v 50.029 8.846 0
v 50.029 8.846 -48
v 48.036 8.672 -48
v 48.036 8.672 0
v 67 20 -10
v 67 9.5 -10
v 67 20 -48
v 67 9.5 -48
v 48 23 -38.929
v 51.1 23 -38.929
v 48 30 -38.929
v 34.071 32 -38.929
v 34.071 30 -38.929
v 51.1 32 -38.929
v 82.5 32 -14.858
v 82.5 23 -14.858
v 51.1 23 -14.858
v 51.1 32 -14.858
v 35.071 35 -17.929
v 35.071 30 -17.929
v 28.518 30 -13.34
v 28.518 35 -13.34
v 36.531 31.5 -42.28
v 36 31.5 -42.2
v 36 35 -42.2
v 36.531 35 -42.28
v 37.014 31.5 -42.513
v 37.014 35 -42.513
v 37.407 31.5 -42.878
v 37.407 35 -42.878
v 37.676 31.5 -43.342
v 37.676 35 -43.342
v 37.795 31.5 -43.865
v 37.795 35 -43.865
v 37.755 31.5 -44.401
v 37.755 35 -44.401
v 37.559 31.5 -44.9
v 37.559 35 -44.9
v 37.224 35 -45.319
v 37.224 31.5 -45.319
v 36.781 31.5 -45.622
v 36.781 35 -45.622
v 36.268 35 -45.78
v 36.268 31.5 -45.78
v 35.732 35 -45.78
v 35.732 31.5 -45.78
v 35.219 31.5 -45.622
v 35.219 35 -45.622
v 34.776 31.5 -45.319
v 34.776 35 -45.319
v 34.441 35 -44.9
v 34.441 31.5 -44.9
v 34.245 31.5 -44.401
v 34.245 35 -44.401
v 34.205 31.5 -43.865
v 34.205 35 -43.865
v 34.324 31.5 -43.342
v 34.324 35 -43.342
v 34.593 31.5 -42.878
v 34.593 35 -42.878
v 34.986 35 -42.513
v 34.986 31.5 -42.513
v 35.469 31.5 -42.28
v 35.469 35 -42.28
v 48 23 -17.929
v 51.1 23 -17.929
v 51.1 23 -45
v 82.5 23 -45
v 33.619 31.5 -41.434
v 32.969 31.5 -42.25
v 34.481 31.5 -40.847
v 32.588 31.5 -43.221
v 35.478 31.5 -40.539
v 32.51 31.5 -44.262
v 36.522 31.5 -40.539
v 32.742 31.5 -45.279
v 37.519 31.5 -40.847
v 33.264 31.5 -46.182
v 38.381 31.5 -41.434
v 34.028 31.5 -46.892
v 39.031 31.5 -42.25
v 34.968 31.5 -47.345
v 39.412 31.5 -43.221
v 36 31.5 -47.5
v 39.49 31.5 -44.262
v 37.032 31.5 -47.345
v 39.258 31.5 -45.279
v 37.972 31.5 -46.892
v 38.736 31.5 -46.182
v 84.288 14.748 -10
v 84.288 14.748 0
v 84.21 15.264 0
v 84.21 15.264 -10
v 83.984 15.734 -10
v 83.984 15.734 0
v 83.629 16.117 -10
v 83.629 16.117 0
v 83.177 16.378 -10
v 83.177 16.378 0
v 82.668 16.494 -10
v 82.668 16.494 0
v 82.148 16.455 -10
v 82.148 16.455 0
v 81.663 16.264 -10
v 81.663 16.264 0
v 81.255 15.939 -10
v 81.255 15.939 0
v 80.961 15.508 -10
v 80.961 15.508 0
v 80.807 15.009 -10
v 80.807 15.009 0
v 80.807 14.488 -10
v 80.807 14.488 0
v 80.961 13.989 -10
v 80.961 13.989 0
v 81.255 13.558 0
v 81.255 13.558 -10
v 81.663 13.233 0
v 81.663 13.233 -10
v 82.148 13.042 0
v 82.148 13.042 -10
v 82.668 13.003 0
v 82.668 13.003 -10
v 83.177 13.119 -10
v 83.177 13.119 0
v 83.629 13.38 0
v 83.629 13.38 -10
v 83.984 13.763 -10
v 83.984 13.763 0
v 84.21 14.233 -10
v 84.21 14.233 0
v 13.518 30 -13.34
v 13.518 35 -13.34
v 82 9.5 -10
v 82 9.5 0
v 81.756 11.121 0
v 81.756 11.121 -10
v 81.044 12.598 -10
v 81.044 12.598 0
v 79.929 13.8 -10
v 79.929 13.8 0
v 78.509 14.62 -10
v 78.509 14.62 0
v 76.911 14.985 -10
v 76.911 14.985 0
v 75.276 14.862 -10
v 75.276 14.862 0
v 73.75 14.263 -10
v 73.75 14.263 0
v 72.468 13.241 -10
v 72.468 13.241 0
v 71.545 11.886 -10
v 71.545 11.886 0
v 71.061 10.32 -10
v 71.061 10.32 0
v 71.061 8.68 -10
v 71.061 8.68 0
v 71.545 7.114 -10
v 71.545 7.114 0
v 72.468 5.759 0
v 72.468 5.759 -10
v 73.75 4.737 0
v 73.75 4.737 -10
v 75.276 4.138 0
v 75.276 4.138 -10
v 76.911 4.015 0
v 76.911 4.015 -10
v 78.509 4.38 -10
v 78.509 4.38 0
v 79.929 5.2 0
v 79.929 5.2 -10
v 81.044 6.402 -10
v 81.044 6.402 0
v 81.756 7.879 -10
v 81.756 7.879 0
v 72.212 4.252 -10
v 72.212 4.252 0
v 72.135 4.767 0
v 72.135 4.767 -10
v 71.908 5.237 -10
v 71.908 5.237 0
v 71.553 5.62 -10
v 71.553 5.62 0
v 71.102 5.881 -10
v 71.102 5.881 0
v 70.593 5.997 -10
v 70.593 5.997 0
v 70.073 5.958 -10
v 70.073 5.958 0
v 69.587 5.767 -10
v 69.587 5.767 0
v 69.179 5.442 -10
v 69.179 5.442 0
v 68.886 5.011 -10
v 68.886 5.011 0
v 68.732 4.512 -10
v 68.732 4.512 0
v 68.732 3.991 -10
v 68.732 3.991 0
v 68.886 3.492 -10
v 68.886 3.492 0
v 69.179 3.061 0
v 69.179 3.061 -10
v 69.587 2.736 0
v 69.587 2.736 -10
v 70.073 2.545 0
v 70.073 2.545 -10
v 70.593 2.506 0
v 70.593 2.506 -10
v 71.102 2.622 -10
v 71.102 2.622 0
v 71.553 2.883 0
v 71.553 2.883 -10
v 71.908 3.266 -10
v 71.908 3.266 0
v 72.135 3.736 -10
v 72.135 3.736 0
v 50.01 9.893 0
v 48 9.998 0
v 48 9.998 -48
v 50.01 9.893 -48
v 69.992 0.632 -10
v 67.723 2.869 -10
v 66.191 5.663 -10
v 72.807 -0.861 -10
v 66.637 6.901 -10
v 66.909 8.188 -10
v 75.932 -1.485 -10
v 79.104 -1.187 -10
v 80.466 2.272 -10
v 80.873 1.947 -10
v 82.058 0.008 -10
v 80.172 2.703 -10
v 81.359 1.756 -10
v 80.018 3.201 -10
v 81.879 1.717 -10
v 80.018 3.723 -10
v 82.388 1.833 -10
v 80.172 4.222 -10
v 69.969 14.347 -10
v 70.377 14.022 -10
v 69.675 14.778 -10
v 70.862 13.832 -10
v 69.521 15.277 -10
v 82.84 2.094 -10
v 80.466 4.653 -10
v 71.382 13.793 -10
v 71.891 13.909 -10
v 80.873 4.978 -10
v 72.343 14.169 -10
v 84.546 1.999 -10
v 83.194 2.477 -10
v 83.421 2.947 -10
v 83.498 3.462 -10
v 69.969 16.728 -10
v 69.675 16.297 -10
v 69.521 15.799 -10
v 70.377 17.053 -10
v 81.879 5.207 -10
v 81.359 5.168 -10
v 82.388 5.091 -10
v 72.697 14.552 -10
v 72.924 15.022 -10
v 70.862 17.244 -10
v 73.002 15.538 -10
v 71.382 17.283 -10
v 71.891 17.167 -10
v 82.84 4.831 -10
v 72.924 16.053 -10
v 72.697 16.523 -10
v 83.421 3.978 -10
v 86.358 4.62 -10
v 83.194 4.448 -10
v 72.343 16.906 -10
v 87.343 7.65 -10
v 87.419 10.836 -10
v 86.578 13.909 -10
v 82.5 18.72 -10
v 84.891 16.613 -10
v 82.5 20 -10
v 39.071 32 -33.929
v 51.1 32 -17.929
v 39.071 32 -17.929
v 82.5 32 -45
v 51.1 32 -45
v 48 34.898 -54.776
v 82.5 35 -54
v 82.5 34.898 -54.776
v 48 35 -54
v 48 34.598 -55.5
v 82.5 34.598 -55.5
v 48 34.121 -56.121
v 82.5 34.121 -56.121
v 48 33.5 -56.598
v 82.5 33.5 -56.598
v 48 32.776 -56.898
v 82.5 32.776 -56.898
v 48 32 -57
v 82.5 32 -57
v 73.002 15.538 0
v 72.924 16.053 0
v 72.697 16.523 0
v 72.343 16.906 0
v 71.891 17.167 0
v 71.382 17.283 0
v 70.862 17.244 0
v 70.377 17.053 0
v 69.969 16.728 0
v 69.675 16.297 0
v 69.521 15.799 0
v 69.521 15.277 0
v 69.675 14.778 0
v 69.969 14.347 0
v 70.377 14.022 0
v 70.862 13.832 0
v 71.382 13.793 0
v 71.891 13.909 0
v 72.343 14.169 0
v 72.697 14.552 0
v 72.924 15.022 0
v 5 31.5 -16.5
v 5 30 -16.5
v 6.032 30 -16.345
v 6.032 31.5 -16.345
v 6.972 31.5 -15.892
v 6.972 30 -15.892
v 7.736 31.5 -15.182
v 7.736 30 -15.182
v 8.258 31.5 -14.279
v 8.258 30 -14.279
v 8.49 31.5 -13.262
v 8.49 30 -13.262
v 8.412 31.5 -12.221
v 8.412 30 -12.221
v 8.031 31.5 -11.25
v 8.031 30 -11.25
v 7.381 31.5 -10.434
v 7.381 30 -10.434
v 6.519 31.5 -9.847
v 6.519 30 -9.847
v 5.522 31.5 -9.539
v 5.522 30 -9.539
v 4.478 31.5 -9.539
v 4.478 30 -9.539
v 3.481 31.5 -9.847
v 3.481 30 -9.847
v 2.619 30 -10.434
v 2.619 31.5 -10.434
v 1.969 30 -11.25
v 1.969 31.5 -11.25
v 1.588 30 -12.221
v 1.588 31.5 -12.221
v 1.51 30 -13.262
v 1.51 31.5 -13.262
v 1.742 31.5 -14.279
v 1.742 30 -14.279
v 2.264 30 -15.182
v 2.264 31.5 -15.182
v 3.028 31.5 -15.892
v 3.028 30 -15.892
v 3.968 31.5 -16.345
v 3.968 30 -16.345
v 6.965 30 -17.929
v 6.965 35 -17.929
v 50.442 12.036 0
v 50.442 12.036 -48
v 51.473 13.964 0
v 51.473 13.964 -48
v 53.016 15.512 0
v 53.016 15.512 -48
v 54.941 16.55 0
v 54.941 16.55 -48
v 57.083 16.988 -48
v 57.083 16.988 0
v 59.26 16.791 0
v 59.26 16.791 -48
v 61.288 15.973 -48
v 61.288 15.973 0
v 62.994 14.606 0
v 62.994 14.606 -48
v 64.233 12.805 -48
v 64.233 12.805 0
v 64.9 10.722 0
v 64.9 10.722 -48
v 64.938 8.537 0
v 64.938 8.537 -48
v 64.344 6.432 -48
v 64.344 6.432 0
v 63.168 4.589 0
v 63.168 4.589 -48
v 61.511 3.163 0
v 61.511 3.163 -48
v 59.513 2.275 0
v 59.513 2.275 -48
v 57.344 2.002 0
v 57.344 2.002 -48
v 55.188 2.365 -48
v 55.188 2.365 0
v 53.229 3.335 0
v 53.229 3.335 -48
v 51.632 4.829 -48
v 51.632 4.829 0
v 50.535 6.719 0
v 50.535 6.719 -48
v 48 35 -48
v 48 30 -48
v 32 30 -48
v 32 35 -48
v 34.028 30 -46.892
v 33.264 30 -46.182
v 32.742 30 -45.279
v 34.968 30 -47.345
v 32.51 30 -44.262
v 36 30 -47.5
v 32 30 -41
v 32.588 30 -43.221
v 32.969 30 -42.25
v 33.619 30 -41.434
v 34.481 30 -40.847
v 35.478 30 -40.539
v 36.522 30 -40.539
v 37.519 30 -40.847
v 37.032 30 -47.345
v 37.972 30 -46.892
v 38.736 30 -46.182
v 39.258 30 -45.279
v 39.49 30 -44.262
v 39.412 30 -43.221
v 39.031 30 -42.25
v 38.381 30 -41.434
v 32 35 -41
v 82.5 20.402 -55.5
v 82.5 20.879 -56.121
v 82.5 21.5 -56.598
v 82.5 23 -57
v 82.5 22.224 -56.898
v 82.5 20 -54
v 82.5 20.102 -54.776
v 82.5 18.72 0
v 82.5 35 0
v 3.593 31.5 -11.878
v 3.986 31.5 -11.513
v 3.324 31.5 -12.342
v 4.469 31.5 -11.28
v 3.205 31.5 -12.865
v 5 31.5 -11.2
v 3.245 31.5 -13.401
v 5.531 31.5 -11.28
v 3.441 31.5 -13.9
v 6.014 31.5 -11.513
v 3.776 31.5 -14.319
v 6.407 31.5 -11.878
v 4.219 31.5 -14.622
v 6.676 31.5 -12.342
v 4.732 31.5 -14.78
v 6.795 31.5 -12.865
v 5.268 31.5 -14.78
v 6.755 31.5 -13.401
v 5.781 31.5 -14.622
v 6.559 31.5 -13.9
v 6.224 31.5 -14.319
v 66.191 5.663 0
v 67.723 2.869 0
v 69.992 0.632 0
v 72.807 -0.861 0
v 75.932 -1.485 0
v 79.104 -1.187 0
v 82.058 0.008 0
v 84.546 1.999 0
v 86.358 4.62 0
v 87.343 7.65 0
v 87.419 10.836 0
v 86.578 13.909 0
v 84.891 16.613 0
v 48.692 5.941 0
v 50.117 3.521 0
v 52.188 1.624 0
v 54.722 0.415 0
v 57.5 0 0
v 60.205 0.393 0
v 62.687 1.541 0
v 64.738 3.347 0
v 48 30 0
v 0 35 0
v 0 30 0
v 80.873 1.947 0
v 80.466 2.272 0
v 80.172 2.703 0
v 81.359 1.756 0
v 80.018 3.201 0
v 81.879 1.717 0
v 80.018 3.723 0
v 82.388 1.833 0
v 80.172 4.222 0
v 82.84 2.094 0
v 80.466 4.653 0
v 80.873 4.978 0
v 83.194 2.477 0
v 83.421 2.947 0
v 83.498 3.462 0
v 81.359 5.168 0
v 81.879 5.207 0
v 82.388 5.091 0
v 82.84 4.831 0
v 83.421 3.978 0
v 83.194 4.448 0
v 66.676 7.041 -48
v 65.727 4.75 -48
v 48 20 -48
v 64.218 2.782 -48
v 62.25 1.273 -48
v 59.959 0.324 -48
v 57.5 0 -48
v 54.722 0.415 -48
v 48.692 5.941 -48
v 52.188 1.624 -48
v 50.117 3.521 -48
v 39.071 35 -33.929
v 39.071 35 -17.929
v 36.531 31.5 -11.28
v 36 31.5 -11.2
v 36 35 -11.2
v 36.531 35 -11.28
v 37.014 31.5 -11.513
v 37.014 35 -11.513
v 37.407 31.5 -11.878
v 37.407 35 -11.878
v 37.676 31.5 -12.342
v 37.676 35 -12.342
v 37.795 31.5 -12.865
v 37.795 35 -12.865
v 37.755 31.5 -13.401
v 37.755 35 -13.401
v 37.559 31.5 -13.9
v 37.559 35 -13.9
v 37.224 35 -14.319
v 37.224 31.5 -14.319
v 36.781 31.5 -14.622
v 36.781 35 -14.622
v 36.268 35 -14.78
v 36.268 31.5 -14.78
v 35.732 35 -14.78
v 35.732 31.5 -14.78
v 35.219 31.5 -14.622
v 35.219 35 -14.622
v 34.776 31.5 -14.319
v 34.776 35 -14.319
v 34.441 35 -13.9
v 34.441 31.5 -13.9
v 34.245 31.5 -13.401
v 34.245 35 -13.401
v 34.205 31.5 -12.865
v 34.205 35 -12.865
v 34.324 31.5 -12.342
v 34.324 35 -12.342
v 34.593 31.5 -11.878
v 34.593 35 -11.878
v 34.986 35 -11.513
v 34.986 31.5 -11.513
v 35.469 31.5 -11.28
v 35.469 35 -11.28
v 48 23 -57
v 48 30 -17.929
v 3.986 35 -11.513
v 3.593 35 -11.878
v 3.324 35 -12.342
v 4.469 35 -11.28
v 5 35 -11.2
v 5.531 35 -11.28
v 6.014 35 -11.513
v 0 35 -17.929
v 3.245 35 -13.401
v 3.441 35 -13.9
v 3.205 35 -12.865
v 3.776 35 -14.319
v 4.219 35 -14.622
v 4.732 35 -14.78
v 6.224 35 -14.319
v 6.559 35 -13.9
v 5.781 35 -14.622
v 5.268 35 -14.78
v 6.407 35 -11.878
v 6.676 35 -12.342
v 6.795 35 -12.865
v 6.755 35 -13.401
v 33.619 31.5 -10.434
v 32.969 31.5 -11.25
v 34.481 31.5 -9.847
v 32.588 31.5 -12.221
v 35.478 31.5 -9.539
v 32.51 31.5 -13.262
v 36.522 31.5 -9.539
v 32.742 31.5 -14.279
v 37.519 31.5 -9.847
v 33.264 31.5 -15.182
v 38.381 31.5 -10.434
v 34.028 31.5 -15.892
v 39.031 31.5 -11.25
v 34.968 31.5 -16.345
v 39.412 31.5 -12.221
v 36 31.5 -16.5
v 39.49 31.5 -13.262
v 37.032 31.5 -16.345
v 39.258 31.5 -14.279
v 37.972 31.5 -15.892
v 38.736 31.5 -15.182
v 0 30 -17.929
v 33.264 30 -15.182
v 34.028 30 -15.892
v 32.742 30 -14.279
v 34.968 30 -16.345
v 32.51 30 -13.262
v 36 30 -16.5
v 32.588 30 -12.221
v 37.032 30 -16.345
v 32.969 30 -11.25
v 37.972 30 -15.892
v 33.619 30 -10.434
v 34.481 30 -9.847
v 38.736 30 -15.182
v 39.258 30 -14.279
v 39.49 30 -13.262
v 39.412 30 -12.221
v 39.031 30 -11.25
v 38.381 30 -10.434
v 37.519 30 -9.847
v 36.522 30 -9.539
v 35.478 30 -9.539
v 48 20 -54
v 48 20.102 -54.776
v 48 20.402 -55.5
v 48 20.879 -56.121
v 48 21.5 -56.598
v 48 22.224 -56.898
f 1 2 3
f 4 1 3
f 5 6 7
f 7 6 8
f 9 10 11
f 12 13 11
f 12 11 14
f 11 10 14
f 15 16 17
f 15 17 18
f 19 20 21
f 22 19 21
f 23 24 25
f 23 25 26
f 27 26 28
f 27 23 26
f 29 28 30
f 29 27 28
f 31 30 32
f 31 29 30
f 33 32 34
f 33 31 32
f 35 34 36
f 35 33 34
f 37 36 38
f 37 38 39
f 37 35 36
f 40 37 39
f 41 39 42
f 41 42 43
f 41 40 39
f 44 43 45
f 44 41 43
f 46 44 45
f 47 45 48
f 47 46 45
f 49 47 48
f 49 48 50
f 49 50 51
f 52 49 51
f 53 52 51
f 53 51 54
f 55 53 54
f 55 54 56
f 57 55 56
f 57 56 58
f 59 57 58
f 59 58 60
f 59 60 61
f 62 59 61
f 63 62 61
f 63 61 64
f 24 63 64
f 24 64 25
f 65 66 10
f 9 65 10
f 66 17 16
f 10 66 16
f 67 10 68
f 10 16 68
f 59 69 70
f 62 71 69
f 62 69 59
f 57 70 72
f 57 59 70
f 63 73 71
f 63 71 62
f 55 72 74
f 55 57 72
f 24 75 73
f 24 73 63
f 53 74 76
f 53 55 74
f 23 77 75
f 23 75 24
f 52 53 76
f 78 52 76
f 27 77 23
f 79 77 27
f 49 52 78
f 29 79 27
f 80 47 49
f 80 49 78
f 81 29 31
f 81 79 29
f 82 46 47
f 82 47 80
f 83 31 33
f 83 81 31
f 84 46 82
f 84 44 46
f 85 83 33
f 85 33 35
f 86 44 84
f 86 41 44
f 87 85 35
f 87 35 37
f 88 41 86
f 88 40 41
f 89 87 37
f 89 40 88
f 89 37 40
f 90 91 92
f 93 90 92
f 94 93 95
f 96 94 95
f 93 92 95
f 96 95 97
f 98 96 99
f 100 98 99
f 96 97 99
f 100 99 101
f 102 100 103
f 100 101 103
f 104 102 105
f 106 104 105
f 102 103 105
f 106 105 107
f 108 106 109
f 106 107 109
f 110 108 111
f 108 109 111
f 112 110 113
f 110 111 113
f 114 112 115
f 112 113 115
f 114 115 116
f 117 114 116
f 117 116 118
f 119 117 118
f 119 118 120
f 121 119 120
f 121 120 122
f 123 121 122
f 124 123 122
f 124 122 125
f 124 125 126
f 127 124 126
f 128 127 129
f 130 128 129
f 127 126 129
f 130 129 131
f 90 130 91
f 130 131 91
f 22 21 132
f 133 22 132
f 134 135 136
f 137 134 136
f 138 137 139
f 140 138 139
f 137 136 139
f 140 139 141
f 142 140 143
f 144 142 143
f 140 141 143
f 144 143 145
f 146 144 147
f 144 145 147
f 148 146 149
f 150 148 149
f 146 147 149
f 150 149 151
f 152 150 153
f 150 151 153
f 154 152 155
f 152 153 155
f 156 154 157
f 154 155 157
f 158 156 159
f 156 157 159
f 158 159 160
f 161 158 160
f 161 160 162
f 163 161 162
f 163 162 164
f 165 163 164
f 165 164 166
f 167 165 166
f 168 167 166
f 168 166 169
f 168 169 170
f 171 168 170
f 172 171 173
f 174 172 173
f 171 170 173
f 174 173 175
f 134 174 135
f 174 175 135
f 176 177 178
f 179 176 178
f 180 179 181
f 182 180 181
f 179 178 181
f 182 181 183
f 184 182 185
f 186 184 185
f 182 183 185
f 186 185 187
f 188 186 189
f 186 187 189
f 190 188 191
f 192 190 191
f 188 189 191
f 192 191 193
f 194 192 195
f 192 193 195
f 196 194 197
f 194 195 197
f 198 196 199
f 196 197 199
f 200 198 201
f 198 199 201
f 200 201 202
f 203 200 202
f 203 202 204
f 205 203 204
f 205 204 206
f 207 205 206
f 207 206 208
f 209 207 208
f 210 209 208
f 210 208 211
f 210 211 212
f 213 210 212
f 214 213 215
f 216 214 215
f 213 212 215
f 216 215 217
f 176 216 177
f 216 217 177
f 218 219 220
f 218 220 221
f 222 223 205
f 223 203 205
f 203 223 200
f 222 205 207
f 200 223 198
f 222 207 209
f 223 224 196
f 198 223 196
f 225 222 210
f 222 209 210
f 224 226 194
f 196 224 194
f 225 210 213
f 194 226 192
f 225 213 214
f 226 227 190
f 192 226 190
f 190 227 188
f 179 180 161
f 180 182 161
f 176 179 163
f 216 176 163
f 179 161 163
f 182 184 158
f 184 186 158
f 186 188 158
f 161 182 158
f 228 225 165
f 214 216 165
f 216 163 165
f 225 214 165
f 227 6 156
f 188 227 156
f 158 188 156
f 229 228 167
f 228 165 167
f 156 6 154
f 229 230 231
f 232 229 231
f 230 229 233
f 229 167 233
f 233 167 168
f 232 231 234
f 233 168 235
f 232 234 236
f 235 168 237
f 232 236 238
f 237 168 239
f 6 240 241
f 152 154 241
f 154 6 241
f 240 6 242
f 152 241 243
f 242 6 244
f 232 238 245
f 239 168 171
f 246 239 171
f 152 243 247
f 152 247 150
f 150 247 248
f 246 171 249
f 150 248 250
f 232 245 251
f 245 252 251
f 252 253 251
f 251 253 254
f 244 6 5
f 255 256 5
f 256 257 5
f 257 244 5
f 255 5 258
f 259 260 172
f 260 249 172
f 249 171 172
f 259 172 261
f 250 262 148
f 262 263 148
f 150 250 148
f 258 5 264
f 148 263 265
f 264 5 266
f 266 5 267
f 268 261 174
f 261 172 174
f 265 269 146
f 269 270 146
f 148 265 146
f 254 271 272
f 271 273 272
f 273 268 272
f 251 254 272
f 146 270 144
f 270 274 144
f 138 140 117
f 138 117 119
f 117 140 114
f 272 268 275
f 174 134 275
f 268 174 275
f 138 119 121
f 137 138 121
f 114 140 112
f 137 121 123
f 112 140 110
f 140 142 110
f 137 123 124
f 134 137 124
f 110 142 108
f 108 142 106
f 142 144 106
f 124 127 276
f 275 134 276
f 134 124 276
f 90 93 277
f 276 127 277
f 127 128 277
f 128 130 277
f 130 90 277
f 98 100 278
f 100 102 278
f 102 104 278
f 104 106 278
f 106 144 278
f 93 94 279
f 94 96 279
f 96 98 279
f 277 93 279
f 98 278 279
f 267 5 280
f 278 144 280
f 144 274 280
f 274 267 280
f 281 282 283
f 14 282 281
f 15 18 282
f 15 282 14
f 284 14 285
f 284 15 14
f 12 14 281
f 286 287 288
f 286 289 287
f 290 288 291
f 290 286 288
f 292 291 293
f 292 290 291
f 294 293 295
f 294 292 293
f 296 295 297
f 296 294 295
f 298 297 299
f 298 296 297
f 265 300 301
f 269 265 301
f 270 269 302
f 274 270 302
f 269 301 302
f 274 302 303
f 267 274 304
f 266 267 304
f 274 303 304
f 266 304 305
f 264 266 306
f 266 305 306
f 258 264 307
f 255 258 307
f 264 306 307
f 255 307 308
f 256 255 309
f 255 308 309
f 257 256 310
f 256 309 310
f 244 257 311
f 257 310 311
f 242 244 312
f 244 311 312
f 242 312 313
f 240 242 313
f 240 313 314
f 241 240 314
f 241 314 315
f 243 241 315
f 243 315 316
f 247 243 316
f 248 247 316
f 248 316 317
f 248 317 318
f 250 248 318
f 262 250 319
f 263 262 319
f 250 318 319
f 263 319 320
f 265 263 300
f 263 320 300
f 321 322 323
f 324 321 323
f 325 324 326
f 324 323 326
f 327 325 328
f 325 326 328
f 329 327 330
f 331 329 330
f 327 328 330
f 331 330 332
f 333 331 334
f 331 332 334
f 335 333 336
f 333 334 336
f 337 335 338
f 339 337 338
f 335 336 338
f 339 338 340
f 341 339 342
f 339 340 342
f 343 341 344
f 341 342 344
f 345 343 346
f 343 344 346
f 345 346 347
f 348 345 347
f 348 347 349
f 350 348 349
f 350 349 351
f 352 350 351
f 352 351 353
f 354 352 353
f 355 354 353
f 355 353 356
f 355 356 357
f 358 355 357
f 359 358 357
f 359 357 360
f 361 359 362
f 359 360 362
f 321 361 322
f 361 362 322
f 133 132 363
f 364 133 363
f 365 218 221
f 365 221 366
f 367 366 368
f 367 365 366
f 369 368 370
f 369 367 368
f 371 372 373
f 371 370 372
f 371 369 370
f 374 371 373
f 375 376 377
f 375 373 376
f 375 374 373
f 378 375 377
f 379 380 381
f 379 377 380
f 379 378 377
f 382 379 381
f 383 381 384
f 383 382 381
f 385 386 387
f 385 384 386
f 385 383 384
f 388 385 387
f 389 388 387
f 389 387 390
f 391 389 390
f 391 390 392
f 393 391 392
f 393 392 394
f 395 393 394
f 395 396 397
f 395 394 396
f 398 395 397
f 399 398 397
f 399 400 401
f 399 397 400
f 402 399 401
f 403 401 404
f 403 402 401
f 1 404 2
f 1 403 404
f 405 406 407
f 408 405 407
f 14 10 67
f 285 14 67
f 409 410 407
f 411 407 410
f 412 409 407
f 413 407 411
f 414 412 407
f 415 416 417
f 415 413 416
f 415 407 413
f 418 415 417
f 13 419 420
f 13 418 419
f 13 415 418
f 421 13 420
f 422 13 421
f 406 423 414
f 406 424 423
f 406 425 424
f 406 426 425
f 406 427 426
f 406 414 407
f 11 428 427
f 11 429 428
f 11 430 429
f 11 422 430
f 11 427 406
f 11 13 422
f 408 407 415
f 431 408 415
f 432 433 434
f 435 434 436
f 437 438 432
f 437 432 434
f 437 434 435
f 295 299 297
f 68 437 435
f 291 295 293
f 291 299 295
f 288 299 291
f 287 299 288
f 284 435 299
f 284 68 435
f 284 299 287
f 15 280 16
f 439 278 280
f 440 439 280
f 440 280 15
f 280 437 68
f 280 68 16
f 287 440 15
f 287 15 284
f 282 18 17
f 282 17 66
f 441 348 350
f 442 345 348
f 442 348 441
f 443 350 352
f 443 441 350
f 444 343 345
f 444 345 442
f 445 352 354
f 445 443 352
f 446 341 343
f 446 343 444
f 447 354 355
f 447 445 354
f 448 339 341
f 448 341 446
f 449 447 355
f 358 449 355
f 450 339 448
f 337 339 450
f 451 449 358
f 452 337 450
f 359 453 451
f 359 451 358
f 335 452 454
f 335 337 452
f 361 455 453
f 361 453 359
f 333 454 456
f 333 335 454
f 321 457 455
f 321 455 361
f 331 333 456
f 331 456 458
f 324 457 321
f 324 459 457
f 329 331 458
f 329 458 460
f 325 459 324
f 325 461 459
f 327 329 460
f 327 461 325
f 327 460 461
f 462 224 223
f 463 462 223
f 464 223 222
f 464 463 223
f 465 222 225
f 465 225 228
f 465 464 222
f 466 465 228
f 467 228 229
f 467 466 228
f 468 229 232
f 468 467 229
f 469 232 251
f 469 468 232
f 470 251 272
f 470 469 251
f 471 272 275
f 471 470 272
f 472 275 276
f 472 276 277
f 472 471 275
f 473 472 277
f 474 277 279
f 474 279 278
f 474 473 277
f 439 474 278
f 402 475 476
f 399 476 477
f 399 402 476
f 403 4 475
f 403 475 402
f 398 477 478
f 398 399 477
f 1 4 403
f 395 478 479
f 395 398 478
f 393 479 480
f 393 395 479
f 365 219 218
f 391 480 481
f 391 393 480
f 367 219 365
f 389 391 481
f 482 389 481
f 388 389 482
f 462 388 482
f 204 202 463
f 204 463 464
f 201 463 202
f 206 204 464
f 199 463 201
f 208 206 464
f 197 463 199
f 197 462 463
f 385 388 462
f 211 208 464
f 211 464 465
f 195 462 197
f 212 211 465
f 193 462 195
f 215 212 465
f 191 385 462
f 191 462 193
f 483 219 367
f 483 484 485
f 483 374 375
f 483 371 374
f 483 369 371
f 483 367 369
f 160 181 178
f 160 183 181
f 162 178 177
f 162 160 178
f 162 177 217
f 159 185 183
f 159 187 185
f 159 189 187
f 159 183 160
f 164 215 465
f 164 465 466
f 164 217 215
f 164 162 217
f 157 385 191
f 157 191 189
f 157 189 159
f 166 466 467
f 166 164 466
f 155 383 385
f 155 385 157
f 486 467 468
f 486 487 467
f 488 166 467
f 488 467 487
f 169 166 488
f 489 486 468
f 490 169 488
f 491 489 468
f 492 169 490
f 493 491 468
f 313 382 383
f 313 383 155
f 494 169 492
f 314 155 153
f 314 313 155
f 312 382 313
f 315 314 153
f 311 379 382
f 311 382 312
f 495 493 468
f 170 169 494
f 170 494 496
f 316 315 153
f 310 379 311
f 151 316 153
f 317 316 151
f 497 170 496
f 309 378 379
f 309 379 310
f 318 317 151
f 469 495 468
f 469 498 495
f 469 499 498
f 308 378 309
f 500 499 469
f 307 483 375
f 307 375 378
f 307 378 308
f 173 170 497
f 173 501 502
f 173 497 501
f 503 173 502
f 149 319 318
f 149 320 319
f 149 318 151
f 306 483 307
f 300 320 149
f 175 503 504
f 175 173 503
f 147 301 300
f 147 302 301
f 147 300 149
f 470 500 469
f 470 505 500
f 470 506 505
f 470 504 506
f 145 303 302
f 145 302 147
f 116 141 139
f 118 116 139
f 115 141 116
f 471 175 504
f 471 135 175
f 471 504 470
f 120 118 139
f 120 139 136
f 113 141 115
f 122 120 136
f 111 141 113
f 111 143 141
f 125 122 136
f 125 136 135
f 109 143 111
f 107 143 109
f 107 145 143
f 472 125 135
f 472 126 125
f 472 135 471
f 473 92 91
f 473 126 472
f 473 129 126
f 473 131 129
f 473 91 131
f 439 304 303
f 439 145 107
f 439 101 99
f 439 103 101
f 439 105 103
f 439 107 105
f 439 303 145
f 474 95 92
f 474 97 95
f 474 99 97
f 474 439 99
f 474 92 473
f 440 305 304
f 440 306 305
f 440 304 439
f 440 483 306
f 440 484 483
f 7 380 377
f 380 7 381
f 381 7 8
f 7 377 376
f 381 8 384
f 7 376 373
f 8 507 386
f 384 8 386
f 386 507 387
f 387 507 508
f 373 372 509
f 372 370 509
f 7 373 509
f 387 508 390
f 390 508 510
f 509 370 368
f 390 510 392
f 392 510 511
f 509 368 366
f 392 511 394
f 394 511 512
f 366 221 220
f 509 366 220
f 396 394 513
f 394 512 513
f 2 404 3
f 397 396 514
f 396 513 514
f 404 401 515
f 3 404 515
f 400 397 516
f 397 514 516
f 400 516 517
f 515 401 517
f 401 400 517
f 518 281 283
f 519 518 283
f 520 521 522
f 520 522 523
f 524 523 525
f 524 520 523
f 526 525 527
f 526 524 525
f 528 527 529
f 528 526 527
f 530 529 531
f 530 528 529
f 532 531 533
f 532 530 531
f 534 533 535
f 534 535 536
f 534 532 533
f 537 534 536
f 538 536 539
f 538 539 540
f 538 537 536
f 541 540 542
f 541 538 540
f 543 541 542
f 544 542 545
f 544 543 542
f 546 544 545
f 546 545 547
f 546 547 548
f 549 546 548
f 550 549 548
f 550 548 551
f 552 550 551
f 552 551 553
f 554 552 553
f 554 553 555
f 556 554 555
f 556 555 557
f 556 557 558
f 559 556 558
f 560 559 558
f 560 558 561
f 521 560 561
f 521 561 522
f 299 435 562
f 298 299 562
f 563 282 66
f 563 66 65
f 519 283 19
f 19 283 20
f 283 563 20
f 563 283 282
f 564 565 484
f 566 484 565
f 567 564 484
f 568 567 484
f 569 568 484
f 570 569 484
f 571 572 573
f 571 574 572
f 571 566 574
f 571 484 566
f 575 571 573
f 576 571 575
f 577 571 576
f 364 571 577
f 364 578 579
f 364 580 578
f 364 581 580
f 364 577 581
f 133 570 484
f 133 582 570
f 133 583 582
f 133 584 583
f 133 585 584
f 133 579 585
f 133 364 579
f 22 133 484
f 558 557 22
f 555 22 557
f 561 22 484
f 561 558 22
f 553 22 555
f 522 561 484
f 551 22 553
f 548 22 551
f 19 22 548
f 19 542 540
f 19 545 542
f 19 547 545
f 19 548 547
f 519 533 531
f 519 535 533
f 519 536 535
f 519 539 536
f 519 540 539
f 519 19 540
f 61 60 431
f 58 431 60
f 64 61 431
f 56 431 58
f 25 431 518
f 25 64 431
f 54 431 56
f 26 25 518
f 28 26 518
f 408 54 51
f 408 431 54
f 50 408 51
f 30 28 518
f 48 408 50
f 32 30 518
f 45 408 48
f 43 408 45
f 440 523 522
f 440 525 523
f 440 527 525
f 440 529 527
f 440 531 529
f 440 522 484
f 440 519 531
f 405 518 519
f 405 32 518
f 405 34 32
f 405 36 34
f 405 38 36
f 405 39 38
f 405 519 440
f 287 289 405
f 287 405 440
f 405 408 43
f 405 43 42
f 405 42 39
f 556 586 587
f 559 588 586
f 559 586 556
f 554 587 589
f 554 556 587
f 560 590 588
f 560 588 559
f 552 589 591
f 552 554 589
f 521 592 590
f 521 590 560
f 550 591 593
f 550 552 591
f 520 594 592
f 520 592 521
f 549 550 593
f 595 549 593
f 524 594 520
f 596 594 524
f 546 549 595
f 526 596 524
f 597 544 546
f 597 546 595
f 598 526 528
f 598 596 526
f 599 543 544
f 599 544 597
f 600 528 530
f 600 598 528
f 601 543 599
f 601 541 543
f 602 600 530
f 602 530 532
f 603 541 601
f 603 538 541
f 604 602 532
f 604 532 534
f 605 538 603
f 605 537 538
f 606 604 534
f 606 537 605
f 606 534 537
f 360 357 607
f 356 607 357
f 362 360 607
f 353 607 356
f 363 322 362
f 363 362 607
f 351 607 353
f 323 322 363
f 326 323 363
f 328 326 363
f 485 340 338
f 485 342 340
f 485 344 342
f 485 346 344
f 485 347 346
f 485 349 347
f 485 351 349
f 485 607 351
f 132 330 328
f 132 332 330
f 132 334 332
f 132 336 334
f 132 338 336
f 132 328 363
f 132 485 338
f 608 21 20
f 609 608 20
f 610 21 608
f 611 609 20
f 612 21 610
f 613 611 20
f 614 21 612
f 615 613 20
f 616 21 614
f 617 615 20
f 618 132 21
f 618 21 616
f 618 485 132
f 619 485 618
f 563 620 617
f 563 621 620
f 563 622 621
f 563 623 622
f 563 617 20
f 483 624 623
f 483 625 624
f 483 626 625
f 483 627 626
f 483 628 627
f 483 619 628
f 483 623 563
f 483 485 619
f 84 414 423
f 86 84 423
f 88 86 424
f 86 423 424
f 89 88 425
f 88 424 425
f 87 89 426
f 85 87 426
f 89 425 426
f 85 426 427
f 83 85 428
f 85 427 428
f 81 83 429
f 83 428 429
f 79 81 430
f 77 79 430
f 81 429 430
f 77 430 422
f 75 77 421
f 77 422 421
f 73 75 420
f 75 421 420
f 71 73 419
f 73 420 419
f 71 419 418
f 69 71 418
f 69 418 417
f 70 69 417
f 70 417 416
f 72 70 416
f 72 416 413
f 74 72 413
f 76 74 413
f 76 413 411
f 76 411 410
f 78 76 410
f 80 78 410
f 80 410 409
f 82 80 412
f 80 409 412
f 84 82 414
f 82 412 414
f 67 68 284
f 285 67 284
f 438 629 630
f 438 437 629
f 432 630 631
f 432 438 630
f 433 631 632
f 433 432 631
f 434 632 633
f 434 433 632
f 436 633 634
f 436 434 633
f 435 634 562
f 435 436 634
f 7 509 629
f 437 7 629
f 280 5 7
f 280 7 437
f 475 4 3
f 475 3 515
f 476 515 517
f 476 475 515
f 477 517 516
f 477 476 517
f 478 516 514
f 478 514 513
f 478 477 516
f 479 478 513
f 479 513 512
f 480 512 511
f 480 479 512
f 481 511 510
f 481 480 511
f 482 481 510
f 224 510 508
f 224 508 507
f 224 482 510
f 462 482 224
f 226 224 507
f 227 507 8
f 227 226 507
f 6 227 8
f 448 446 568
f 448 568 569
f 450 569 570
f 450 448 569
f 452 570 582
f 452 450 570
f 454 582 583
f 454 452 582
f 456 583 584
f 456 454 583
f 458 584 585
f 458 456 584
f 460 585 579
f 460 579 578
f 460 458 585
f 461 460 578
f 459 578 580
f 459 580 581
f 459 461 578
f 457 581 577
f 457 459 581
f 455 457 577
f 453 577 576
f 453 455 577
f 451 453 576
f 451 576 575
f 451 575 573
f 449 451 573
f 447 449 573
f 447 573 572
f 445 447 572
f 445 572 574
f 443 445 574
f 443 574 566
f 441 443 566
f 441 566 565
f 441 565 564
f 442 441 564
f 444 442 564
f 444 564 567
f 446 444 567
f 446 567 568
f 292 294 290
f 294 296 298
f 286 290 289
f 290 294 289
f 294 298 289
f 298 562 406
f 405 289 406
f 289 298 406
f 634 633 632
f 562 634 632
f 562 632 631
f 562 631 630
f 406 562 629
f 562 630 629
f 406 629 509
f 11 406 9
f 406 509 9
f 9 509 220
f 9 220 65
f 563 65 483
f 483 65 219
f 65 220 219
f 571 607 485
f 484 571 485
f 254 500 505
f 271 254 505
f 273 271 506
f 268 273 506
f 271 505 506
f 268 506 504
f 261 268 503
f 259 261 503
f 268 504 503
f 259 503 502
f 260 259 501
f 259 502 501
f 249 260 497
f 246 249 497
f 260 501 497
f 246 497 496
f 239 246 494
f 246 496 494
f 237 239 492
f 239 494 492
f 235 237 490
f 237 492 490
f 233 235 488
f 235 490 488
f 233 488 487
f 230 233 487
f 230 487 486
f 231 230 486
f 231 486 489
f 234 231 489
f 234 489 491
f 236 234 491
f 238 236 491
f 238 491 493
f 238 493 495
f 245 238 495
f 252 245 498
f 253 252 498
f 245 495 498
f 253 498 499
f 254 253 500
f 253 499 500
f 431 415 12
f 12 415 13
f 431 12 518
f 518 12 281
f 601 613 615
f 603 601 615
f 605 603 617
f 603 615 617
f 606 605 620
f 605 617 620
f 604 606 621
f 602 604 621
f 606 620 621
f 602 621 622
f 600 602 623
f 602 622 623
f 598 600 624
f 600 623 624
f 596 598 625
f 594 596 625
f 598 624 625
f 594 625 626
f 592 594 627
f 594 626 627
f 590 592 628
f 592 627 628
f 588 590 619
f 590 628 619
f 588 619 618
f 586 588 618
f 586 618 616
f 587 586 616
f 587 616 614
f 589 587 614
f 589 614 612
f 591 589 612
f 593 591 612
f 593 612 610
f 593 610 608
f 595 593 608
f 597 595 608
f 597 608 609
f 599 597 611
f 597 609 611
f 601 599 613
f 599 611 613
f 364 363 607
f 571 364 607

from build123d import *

# Parameters (mm, degrees)
SKETCH1_R               = 1.8
BOSS_EXTRUDE1_DEPTH     = 35
CUT_EXTRUDE1_DEPTH      = 20
FILLET1_R               = 3
CUT_EXTRUDE2_DEPTH      = 102.662431606
CUT_EXTRUDE2_DEPTH_BACK = 102.662431606
SKETCH5_W               = 48
SKETCH5_H               = 48
CUT_EXTRUDE3_DEPTH      = 30
SKETCH6_W               = 30.142
SKETCH6_H               = 9
CUT_EXTRUDE4_DEPTH      = 31.4
SKETCH7_W               = 21
SKETCH7_H               = 9
CUT_EXTRUDE5_DEPTH      = 85.173689476
SKETCH8_R               = 3.5
CUT_EXTRUDE6_DEPTH      = 1.5
SKETCH11_R              = 1.75
SKETCH11_R_2            = 5.5
BOSS_EXTRUDE3_DEPTH     = 10


with BuildPart() as part:
    # Sketch1 → Boss-Extrude1 (new body)
    with BuildSketch(Plane(origin=(0, 0, 0), x_dir=(1, 0, 0), z_dir=(0, 1, 0))):
        Polygon((6.964635103, 17.928932188), (0, 17.928932188), (0, 0), (82.5, 0), (82.5, 57), (48, 57), (48, 48), (32, 48), (32, 41), (39.071067812, 33.928932188), (39.071067812, 17.928932188), (35.071067812, 17.928932188), (28.517851458, 13.340320697), (13.517851458, 13.340320697), align=None)
        with Locations(Location((36, 44, 0), (0, 0, 270))):
            Circle(SKETCH1_R, mode=Mode.SUBTRACT)
        with Locations(Location((36, 13, 0), (0, 0, 270))):
            Circle(SKETCH1_R, mode=Mode.SUBTRACT)
        with Locations(Location((5, 13, 0), (0, 0, 270))):
            Circle(SKETCH1_R, mode=Mode.SUBTRACT)
    extrude(amount=BOSS_EXTRUDE1_DEPTH)

    # Sketch2 → Cut-Extrude1 (cut)
    with BuildSketch(Plane.XZ):
        Polygon((82.5, -57), (82.5, 0), (67, 0), (67, -48), (48, -48), (48, -57), align=None)
    extrude(amount=-CUT_EXTRUDE1_DEPTH, mode=Mode.SUBTRACT)

    # Fillet1
    fillet1_edges = [part.edges().sort_by_distance(p)[0] for p in [
        (65.25, 35, -57),
        (65.25, 20, -57),
    ]]
    fillet(fillet1_edges, radius=FILLET1_R)

    # Sketch3 → Cut-Extrude2 (cut, two sides: drawn at the far end of the back side and taken through both)
    with BuildSketch(Plane(origin=(0, 0, -48), x_dir=(-1, 0, 0), z_dir=(0, 0, -1)).offset(-CUT_EXTRUDE2_DEPTH_BACK)):
        with BuildLine():
            ThreePointArc((-50.010278489, 9.892519672), (-64.998857714, 9.630893048), (-50.028539764, 8.846331929))
            Line((-50.028539764, 8.846331929), (-48.036150368, 8.672020444))
            ThreePointArc((-48.036150368, 8.672020444), (-51.081893028, 2.4958653), (-57.5, 0))
            Line((-57.5, 0), (-48, 0))
            Line((-48, 0), (-48, 9.997873903))
            Line((-48, 9.997873903), (-50.010278489, 9.892519672))
        make_face()
        with BuildLine():
            Line((-67, 0), (-57.5, 0))
            ThreePointArc((-57.5, 0), (-64.217514421, 2.782485579), (-67, 9.5))
            Line((-67, 9.5), (-67, 0))
        make_face()
    extrude(amount=CUT_EXTRUDE2_DEPTH + CUT_EXTRUDE2_DEPTH_BACK, mode=Mode.SUBTRACT)

    # Sketch5 → Cut-Extrude3 (cut)
    with BuildSketch(Plane.XZ):
        with Locations((24, -24)):
            Rectangle(SKETCH5_W, SKETCH5_H)
    extrude(amount=-CUT_EXTRUDE3_DEPTH, mode=Mode.SUBTRACT)

    # Sketch6 → Cut-Extrude4 (cut)
    with BuildSketch(Plane(origin=(82.5, 0, 0), x_dir=(0, 0, -1), z_dir=(1, 0, 0))):
        with Locations((29.929, 27.5)):
            Rectangle(SKETCH6_W, SKETCH6_H)
    extrude(amount=-CUT_EXTRUDE4_DEPTH, mode=Mode.SUBTRACT)

    # Sketch7 → Cut-Extrude5 (cut, through all)
    with BuildSketch(Plane(origin=(51.1, 0, 0), x_dir=(0, 0, -1), z_dir=(1, 0, 0))):
        with Locations((28.428932188, 27.5)):
            Rectangle(SKETCH7_W, SKETCH7_H)
    extrude(amount=-CUT_EXTRUDE5_DEPTH, mode=Mode.SUBTRACT)

    # Sketch8 → Cut-Extrude6 (cut)
    with BuildSketch(Plane.XZ.offset(-30)):
        with Locations(Location((5, -13, 0), (0, 0, 270))):
            Circle(SKETCH8_R)
        with Locations(Location((36, -13, 0), (0, 0, 270))):
            Circle(SKETCH8_R)
        with Locations(Location((36, -44, 0), (0, 0, 270))):
            Circle(SKETCH8_R)
    extrude(amount=-CUT_EXTRUDE6_DEPTH, mode=Mode.SUBTRACT)

    # Sketch11 → Boss-Extrude3 (add)
    with BuildSketch(Plane.XY):
        with BuildLine():
            Line((67, 20), (67, 9.5))
            ThreePointArc((67, 9.5), (66.795496221, 7.539451607), (66.190789474, 5.663311542))
            ThreePointArc((66.190789474, 5.663311542), (83.374491132, 0.912720357), (82.5, 18.719544457))
            Line((82.5, 18.719544457), (82.5, 20))
            Line((82.5, 20), (67, 20))
        make_face()
        with Locations((82.537676642, 14.748472232)):
            Circle(SKETCH11_R, mode=Mode.SUBTRACT)
        with Locations((70.462323358, 4.251527768)):
            Circle(SKETCH11_R, mode=Mode.SUBTRACT)
        with Locations((81.748472232, 3.462323358)):
            Circle(SKETCH11_R, mode=Mode.SUBTRACT)
        with Locations((76.5, 9.5)):
            Circle(SKETCH11_R_2, mode=Mode.SUBTRACT)
        with Locations((71.251527768, 15.537676642)):
            Circle(SKETCH11_R, mode=Mode.SUBTRACT)
    extrude(amount=-BOSS_EXTRUDE3_DEPTH)


solid = part.part
